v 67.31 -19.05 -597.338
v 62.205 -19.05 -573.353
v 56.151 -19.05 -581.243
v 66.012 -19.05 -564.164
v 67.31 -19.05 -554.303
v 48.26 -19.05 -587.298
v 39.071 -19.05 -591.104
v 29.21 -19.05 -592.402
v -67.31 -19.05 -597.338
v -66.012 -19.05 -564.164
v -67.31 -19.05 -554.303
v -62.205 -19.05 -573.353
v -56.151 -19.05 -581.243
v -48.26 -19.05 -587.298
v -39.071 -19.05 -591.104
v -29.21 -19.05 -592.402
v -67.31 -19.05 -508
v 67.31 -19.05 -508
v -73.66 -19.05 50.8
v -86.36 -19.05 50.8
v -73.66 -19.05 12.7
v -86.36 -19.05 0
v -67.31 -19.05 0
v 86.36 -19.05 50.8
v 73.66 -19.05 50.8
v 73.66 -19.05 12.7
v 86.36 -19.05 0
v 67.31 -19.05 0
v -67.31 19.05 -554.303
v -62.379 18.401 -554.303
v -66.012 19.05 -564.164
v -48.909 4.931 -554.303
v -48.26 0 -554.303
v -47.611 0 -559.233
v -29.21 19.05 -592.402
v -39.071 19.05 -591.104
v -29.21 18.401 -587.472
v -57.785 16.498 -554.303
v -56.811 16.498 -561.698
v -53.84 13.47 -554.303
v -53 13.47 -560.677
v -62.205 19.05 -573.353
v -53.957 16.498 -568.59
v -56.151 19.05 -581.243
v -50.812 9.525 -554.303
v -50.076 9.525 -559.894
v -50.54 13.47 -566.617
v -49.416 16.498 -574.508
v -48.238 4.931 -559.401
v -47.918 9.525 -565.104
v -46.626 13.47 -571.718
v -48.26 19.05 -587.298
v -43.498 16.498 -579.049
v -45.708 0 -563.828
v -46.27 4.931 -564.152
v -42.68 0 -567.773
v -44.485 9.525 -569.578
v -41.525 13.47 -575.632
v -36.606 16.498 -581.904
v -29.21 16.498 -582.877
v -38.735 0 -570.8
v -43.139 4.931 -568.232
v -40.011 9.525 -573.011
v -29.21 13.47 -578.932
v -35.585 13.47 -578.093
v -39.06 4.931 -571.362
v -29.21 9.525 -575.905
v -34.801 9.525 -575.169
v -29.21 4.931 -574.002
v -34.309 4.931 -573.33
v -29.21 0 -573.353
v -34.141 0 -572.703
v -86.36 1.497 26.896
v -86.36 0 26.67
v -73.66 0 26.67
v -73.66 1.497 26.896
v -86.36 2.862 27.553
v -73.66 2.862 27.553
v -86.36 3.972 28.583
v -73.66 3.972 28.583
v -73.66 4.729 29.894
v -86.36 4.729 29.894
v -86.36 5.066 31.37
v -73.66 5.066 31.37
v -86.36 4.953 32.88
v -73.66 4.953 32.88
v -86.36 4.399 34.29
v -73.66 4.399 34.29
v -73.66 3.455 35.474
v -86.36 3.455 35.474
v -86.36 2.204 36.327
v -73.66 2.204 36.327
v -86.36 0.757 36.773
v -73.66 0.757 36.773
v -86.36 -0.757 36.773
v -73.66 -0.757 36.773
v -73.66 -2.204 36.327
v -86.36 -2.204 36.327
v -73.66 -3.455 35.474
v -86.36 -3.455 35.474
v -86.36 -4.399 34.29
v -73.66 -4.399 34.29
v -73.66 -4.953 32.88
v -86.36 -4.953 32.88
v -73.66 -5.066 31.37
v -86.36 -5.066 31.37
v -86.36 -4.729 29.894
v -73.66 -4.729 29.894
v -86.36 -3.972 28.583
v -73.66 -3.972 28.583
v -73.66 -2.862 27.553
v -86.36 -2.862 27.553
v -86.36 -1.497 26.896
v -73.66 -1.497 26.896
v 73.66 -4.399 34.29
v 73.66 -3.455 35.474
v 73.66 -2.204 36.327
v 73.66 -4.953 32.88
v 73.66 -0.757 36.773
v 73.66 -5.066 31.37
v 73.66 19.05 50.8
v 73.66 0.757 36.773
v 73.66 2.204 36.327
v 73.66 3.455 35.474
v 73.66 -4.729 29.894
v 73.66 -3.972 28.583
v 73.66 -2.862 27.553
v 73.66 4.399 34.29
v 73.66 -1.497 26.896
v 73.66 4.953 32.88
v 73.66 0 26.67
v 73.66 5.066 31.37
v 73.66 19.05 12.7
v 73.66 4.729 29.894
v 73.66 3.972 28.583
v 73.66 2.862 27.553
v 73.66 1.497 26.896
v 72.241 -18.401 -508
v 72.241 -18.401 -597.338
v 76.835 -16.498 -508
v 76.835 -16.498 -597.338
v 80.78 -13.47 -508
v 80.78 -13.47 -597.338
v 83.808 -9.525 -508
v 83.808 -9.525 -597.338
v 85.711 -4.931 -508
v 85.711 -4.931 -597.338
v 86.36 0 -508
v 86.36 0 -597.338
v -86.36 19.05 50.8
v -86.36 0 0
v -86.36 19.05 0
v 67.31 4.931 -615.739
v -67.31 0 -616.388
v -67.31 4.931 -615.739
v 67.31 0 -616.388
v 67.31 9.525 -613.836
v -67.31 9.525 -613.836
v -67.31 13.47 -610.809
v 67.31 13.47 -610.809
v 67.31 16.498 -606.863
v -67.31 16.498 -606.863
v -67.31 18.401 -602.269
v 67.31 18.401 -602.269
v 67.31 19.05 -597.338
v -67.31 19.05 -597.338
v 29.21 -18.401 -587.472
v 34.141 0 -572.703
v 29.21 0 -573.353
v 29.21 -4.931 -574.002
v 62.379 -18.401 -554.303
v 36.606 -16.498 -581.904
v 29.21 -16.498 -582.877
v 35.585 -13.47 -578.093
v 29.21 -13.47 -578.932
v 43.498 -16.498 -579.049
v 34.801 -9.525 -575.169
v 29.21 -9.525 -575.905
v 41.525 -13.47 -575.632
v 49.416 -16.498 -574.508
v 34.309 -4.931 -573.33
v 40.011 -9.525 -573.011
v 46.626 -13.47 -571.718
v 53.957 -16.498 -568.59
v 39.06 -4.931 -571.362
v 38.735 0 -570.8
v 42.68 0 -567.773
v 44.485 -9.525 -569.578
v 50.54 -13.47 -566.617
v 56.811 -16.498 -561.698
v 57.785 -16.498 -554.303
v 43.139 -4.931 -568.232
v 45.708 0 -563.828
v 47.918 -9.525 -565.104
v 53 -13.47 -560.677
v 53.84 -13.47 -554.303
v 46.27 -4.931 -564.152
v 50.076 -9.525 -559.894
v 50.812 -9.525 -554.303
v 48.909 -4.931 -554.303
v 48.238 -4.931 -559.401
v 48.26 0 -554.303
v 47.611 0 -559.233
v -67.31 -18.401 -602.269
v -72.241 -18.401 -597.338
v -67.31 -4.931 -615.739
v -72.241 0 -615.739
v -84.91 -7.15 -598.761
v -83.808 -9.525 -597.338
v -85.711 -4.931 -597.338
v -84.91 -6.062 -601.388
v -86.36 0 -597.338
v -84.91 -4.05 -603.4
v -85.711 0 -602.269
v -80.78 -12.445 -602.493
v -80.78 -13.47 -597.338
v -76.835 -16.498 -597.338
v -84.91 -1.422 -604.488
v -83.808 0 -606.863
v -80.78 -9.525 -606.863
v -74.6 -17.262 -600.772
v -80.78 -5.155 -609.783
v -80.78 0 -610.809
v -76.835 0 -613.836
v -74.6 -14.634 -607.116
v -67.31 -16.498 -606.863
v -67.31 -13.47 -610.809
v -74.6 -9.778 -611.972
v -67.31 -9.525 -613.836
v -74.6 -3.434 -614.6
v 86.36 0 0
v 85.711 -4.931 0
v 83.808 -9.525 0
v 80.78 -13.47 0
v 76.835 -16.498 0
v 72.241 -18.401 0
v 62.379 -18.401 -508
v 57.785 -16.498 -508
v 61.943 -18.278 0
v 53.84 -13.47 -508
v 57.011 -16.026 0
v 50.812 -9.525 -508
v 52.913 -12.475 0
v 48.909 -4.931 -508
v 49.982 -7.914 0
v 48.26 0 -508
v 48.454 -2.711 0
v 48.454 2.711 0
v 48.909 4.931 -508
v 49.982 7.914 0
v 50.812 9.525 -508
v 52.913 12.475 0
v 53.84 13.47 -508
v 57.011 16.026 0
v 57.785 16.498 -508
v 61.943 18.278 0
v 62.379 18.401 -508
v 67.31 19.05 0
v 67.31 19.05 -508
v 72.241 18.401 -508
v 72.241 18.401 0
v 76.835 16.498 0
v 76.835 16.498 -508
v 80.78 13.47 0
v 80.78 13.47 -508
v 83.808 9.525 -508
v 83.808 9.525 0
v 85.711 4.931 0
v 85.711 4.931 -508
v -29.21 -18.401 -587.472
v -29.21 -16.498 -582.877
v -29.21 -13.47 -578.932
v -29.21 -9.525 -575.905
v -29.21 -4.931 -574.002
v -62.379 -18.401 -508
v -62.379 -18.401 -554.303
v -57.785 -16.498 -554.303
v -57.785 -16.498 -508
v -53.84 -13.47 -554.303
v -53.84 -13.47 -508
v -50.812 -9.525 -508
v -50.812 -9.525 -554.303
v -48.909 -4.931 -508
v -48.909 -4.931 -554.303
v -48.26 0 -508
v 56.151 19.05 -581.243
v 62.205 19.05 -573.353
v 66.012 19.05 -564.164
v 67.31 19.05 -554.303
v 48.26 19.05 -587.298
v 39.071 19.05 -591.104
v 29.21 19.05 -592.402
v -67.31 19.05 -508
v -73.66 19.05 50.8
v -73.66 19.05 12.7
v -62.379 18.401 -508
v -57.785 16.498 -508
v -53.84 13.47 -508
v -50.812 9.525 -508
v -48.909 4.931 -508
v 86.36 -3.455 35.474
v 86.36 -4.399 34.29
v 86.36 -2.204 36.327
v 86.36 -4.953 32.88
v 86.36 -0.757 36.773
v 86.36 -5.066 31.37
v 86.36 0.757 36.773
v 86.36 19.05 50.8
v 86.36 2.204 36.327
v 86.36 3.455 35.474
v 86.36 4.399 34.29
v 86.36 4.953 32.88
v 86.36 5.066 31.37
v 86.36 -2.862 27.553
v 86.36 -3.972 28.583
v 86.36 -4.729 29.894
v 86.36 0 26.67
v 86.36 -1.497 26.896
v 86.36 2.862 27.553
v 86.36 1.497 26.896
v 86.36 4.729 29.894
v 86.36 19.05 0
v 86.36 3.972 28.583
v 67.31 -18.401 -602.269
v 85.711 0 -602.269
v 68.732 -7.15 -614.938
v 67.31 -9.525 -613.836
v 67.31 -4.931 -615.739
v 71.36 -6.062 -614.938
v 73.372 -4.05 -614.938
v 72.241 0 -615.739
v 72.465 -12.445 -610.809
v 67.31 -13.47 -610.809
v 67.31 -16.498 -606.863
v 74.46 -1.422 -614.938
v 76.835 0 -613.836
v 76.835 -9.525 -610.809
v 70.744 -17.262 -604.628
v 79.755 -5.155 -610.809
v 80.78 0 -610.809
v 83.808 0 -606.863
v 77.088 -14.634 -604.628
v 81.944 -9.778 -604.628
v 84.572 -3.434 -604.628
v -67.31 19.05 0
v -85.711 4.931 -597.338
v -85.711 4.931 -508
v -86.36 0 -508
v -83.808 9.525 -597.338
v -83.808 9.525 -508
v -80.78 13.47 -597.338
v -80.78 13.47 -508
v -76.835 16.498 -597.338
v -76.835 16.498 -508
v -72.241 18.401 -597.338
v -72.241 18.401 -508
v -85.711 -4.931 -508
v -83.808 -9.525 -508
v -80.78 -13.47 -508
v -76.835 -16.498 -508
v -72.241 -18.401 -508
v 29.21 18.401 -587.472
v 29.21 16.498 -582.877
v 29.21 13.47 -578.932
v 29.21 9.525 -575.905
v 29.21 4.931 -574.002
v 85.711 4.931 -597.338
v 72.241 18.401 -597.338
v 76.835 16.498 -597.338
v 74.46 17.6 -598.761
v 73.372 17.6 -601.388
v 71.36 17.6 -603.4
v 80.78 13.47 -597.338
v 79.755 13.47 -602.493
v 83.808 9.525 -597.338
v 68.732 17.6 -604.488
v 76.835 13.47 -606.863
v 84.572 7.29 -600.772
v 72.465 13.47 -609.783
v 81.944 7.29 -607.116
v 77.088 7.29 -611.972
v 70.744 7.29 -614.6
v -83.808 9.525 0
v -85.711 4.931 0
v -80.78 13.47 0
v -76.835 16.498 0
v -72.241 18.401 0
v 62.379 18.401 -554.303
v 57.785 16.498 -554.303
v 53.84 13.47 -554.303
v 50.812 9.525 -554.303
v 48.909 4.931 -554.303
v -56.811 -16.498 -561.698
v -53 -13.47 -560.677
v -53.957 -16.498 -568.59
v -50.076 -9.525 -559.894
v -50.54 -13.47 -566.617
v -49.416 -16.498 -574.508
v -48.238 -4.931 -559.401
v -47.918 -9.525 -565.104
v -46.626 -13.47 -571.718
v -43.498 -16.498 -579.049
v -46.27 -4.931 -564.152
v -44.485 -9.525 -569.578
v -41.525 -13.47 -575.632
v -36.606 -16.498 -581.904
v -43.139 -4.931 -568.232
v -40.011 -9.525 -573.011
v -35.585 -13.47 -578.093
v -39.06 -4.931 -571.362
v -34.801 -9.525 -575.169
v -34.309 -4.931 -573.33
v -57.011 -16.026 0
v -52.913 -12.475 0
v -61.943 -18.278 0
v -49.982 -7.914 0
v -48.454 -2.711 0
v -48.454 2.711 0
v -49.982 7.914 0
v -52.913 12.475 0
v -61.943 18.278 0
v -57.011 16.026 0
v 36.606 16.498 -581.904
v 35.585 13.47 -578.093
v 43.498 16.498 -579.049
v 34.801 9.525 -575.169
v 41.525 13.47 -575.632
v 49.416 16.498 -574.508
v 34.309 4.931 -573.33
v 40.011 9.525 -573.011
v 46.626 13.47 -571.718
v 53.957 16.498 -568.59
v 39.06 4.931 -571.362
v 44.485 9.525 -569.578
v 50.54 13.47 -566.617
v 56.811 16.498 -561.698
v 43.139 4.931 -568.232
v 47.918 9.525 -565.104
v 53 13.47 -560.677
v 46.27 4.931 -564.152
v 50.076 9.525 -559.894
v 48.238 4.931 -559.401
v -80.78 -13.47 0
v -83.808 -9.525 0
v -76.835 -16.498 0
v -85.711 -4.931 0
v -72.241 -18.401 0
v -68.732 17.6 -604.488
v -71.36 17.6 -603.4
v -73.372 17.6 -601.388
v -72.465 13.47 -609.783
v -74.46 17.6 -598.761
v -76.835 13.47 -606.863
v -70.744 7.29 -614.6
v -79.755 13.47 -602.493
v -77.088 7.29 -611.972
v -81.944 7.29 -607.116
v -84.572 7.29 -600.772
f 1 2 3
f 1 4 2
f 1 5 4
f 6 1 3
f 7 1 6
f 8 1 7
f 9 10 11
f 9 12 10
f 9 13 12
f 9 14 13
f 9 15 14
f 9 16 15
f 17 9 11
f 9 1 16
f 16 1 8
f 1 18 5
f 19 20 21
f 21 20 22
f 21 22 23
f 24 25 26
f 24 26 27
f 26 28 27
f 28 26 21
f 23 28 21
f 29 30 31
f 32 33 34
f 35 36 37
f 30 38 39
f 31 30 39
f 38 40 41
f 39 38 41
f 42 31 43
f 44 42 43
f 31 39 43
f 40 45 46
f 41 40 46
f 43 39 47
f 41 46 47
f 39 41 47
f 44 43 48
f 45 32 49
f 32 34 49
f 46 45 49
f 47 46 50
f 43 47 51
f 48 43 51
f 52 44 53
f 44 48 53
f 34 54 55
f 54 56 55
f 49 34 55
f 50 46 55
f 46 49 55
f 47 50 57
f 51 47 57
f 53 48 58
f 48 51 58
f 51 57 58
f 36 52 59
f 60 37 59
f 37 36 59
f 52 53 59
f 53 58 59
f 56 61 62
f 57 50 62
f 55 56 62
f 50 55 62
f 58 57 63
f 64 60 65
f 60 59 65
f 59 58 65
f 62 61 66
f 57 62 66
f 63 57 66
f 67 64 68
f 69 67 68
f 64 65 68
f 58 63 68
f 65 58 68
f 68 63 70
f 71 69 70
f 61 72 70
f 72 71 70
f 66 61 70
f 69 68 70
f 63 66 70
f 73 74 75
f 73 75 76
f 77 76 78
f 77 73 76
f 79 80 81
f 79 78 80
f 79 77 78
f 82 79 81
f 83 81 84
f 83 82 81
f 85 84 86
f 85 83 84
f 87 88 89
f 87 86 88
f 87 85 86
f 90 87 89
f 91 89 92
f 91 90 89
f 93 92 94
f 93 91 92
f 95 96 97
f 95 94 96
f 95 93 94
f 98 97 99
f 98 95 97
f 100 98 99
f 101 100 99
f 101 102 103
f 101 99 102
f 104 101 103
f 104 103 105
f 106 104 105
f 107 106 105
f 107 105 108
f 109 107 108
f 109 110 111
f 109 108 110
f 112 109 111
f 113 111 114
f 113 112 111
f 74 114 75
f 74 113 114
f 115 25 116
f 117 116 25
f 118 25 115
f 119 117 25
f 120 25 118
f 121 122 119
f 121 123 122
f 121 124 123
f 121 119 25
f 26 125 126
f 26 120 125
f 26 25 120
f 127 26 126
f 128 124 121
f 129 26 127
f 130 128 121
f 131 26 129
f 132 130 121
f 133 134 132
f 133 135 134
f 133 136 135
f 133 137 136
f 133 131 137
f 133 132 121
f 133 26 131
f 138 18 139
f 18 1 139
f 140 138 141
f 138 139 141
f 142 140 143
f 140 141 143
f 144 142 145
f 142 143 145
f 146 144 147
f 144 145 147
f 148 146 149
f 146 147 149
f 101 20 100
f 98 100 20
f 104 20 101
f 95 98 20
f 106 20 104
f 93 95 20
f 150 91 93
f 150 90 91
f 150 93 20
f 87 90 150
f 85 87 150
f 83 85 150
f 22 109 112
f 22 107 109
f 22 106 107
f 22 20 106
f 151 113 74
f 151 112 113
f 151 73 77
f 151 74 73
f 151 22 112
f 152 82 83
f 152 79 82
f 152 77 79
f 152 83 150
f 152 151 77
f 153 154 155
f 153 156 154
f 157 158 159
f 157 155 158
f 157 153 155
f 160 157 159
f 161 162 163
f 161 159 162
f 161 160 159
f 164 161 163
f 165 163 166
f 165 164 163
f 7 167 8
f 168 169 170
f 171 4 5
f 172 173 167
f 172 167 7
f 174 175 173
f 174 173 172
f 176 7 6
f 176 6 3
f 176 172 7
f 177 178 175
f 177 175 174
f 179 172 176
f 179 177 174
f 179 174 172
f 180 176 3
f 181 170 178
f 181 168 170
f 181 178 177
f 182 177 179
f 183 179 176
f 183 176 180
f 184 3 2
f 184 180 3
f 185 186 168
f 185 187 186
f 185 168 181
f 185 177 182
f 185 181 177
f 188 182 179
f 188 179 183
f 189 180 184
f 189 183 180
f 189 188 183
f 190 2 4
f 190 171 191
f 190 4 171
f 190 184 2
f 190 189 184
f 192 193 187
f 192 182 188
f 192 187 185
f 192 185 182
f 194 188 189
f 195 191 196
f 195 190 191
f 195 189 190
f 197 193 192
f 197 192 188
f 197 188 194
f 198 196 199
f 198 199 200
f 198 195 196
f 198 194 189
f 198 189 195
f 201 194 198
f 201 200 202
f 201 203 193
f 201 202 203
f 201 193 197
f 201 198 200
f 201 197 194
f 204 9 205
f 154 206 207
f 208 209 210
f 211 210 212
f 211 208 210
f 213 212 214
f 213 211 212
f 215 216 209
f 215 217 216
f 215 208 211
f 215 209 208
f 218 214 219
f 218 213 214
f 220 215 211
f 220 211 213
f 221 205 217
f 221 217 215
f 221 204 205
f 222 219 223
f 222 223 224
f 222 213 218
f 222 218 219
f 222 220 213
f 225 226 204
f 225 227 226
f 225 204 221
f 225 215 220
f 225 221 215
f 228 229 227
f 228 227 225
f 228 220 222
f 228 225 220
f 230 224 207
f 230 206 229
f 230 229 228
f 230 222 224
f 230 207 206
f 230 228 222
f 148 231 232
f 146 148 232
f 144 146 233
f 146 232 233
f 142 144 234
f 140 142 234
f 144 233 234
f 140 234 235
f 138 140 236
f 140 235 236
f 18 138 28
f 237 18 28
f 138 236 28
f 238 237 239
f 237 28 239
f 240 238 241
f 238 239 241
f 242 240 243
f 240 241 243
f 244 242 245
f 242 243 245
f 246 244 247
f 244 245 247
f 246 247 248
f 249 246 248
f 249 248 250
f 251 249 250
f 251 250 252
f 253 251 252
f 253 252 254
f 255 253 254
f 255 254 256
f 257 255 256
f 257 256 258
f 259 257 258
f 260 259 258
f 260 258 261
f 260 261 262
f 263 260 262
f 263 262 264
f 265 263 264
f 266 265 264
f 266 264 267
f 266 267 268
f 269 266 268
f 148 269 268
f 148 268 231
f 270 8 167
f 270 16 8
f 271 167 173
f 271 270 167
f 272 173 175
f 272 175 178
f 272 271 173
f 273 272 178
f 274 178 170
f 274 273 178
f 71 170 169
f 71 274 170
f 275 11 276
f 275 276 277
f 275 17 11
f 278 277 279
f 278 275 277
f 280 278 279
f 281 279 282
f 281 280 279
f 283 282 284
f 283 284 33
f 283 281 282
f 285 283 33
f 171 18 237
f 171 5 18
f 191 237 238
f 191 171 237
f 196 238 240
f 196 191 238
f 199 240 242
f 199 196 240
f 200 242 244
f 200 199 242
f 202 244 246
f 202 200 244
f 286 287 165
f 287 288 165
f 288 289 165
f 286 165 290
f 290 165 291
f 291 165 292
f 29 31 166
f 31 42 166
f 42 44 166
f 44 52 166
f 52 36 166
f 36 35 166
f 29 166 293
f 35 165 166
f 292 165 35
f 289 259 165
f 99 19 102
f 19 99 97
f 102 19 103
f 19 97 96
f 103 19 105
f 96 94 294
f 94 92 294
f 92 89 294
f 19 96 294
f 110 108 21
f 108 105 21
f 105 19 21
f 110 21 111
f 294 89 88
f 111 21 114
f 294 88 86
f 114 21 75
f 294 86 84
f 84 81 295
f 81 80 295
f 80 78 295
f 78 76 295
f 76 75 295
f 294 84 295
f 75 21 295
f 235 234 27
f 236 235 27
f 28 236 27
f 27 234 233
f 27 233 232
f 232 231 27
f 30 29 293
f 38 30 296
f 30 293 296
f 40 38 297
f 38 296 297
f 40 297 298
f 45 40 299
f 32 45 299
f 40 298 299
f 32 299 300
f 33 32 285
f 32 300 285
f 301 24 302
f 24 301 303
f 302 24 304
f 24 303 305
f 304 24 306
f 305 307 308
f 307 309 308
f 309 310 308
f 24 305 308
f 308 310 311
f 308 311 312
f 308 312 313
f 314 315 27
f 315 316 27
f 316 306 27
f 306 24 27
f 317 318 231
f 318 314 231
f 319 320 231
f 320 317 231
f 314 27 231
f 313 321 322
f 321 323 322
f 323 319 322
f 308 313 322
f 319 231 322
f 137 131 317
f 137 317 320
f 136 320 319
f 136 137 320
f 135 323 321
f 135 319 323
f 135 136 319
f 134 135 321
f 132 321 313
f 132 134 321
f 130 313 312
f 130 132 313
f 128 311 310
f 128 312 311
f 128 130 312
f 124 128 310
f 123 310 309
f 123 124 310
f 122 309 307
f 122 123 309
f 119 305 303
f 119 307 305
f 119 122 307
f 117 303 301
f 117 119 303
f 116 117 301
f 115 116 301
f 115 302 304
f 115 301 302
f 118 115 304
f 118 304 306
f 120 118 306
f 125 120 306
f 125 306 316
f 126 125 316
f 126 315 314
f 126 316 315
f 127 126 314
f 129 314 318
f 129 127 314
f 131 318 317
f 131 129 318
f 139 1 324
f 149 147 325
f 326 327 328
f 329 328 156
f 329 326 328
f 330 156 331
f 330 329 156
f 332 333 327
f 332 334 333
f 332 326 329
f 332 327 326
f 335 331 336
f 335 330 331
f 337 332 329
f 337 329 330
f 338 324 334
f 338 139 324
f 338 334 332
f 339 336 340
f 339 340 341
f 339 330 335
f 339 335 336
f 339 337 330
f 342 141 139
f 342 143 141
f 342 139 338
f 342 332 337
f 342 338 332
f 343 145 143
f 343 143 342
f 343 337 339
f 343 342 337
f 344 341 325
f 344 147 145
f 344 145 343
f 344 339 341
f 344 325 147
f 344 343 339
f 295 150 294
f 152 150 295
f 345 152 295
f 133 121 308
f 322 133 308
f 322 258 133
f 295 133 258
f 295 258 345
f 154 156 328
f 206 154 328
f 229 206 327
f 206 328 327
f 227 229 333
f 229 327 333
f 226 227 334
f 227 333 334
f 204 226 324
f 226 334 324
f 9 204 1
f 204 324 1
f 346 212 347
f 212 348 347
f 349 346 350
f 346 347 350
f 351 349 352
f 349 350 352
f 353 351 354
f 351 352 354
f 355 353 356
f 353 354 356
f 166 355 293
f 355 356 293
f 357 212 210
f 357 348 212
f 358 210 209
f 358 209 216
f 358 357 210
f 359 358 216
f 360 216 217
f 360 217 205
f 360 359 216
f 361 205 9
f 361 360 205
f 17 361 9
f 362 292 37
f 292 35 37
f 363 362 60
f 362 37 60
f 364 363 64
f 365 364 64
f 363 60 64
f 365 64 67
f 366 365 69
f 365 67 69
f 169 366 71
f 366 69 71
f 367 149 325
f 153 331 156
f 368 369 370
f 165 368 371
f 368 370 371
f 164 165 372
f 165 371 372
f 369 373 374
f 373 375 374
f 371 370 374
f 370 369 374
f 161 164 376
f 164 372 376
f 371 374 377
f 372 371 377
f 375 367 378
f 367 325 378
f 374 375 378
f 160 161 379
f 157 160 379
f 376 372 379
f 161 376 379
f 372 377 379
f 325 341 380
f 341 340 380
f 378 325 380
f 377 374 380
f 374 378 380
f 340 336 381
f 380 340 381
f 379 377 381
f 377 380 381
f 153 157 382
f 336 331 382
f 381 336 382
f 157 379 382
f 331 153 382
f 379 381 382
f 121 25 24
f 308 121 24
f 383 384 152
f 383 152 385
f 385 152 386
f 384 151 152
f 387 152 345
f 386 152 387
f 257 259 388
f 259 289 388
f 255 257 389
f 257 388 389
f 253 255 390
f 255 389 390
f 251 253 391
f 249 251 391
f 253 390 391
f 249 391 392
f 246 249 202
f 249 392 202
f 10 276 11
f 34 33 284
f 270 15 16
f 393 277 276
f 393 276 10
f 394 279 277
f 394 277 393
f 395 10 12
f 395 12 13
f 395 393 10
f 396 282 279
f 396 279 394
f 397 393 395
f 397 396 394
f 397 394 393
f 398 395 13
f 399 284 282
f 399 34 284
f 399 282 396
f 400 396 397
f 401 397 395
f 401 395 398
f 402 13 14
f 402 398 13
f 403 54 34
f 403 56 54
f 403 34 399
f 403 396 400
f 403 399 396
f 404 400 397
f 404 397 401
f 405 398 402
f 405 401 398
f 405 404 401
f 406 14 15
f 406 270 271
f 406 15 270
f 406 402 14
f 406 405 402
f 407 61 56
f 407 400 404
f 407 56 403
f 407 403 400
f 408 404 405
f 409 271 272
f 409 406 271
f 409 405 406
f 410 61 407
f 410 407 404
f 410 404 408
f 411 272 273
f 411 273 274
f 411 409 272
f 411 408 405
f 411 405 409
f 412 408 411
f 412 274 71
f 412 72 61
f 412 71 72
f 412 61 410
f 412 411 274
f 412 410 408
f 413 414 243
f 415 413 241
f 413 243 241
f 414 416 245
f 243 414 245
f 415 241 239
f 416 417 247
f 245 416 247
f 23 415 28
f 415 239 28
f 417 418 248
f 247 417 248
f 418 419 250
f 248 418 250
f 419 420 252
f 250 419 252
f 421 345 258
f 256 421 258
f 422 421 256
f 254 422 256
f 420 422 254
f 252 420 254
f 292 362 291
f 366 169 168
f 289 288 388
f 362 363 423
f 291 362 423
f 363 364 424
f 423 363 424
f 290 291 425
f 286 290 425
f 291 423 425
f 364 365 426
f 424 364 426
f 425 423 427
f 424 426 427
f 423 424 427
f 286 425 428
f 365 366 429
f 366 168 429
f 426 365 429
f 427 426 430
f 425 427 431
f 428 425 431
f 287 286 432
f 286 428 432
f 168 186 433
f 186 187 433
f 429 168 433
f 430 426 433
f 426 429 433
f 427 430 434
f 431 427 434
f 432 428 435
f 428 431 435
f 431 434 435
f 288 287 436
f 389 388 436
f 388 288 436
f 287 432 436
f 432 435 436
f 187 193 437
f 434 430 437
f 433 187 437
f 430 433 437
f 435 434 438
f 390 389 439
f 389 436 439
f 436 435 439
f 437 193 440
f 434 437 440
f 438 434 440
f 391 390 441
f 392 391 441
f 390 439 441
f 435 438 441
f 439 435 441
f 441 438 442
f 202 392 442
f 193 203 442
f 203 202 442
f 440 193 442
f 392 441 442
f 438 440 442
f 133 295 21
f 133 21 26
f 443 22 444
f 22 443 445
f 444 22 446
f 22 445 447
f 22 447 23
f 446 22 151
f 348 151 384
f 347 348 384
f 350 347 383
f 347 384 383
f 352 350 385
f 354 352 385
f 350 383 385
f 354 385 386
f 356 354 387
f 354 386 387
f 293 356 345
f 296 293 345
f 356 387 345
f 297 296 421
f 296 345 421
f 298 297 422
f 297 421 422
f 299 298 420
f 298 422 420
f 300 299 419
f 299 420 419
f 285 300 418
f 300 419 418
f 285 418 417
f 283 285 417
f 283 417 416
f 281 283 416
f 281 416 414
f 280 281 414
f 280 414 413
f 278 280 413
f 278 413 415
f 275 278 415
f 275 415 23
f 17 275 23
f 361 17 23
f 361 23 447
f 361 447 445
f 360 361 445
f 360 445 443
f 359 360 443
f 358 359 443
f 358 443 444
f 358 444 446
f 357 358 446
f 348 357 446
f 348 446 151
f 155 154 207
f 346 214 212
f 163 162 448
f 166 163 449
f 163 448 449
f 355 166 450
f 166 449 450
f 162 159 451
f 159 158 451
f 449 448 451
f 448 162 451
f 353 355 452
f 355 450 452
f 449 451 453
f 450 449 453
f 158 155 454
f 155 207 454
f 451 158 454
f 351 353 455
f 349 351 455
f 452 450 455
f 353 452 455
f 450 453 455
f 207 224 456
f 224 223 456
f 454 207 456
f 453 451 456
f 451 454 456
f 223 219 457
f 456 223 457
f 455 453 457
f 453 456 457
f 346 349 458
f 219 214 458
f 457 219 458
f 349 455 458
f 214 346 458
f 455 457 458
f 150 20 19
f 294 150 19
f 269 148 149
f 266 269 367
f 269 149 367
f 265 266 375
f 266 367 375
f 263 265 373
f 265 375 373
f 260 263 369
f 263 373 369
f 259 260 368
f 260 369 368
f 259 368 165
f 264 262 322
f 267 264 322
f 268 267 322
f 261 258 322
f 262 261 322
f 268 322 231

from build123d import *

# Parameters (mm, degrees)
SKETCH1_W               = 172.72
SKETCH1_H               = 38.1
BOSS_EXTRUDE1_DEPTH     = 12.7
SKETCH2_W               = 12.7
SKETCH2_H               = 38.1
BOSS_EXTRUDE2_DEPTH     = 38.1
SKETCH3_R               = 19.05
BOSS_EXTRUDE3_DEPTH     = 508
BOSS_EXTRUDE5_DEPTH     = 19.05
FILLET3_R               = 19.05
CUT_EXTRUDE1_DEPTH      = 638.105779031
CUT_EXTRUDE1_DEPTH_BACK = 638.105779031
SKETCH5_R               = 5.08


with BuildPart() as part:
    # Sketch1 → Boss-Extrude1 (new body)
    with BuildSketch(Plane.XY):
        Rectangle(SKETCH1_W, SKETCH1_H)
    extrude(amount=BOSS_EXTRUDE1_DEPTH)

    # Sketch2 → Boss-Extrude2 (add)
    with BuildSketch(Plane.XY.offset(12.7)):
        with Locations((-80.01, 0)):
            Rectangle(SKETCH2_W, SKETCH2_H)
        with Locations((80.01, 0)):
            Rectangle(SKETCH2_W, SKETCH2_H)
    extrude(amount=BOSS_EXTRUDE2_DEPTH)

    # Sketch3 → Boss-Extrude3 (add)
    with BuildSketch(Plane(origin=(0, 0, 0), x_dir=(-1, 0, 0), z_dir=(0, 0, -1))):
        with Locations(Location((-67.31, 0, 0), (0, 0, 180))):
            Circle(SKETCH3_R)
        with Locations((67.31, 0)):
            Circle(SKETCH3_R)
    extrude(amount=BOSS_EXTRUDE3_DEPTH)

    # Sketch4 → Boss-Extrude5 (add, symmetric)
    with BuildSketch(Plane(origin=(0, 0, 0), x_dir=(1, 0, 0), z_dir=(0, 1, 0))):
        Polygon((-86.36, 616.388246785), (86.36, 616.388246785), (86.36, 573.352506856), (86.36, 508), (48.26, 508), (48.26, 573.352506856), (-48.26, 573.352506856), (-48.26, 508), (-86.36, 508), (-86.36, 573.352506856), align=None)
    extrude(amount=BOSS_EXTRUDE5_DEPTH, both=True)

    # Fillet3
    fillet3_edges = [part.edges().sort_by_distance(p)[0] for p in [
        (86.36, -19.05, -562.194123393),
        (0, -19.05, -616.388246785),
        (86.36, 0, -616.388246785),
        (-86.36, -19.05, -562.194123393),
        (-86.36, 0, -616.388246785),
        (-48.26, -19.05, -540.676253428),
        (0, -19.05, -573.352506856),
        (-48.26, 0, -573.352506856),
        (48.26, -19.05, -540.676253428),
        (48.26, 0, -573.352506856),
        (86.36, 19.05, -562.194123393),
        (0, 19.05, -616.388246785),
        (-86.36, 19.05, -562.194123393),
        (-48.26, 19.05, -540.676253428),
        (0, 19.05, -573.352506856),
        (48.26, 19.05, -540.676253428),
    ]]
    fillet(fillet3_edges, radius=FILLET3_R - 0.0001)  # a hair under: the kernel refuses the full size

    # Sketch5 → Cut-Extrude1 (cut, two sides: drawn at the far end of the back side and taken through both)
    with BuildSketch(Plane(origin=(-73.66, 0, 0), x_dir=(0, 0, -1), z_dir=(1, 0, 0)).offset(-CUT_EXTRUDE1_DEPTH_BACK)):
        with Locations((-31.75, 0)):
            Circle(SKETCH5_R)
    extrude(amount=CUT_EXTRUDE1_DEPTH + CUT_EXTRUDE1_DEPTH_BACK, mode=Mode.SUBTRACT)


solid = part.part
